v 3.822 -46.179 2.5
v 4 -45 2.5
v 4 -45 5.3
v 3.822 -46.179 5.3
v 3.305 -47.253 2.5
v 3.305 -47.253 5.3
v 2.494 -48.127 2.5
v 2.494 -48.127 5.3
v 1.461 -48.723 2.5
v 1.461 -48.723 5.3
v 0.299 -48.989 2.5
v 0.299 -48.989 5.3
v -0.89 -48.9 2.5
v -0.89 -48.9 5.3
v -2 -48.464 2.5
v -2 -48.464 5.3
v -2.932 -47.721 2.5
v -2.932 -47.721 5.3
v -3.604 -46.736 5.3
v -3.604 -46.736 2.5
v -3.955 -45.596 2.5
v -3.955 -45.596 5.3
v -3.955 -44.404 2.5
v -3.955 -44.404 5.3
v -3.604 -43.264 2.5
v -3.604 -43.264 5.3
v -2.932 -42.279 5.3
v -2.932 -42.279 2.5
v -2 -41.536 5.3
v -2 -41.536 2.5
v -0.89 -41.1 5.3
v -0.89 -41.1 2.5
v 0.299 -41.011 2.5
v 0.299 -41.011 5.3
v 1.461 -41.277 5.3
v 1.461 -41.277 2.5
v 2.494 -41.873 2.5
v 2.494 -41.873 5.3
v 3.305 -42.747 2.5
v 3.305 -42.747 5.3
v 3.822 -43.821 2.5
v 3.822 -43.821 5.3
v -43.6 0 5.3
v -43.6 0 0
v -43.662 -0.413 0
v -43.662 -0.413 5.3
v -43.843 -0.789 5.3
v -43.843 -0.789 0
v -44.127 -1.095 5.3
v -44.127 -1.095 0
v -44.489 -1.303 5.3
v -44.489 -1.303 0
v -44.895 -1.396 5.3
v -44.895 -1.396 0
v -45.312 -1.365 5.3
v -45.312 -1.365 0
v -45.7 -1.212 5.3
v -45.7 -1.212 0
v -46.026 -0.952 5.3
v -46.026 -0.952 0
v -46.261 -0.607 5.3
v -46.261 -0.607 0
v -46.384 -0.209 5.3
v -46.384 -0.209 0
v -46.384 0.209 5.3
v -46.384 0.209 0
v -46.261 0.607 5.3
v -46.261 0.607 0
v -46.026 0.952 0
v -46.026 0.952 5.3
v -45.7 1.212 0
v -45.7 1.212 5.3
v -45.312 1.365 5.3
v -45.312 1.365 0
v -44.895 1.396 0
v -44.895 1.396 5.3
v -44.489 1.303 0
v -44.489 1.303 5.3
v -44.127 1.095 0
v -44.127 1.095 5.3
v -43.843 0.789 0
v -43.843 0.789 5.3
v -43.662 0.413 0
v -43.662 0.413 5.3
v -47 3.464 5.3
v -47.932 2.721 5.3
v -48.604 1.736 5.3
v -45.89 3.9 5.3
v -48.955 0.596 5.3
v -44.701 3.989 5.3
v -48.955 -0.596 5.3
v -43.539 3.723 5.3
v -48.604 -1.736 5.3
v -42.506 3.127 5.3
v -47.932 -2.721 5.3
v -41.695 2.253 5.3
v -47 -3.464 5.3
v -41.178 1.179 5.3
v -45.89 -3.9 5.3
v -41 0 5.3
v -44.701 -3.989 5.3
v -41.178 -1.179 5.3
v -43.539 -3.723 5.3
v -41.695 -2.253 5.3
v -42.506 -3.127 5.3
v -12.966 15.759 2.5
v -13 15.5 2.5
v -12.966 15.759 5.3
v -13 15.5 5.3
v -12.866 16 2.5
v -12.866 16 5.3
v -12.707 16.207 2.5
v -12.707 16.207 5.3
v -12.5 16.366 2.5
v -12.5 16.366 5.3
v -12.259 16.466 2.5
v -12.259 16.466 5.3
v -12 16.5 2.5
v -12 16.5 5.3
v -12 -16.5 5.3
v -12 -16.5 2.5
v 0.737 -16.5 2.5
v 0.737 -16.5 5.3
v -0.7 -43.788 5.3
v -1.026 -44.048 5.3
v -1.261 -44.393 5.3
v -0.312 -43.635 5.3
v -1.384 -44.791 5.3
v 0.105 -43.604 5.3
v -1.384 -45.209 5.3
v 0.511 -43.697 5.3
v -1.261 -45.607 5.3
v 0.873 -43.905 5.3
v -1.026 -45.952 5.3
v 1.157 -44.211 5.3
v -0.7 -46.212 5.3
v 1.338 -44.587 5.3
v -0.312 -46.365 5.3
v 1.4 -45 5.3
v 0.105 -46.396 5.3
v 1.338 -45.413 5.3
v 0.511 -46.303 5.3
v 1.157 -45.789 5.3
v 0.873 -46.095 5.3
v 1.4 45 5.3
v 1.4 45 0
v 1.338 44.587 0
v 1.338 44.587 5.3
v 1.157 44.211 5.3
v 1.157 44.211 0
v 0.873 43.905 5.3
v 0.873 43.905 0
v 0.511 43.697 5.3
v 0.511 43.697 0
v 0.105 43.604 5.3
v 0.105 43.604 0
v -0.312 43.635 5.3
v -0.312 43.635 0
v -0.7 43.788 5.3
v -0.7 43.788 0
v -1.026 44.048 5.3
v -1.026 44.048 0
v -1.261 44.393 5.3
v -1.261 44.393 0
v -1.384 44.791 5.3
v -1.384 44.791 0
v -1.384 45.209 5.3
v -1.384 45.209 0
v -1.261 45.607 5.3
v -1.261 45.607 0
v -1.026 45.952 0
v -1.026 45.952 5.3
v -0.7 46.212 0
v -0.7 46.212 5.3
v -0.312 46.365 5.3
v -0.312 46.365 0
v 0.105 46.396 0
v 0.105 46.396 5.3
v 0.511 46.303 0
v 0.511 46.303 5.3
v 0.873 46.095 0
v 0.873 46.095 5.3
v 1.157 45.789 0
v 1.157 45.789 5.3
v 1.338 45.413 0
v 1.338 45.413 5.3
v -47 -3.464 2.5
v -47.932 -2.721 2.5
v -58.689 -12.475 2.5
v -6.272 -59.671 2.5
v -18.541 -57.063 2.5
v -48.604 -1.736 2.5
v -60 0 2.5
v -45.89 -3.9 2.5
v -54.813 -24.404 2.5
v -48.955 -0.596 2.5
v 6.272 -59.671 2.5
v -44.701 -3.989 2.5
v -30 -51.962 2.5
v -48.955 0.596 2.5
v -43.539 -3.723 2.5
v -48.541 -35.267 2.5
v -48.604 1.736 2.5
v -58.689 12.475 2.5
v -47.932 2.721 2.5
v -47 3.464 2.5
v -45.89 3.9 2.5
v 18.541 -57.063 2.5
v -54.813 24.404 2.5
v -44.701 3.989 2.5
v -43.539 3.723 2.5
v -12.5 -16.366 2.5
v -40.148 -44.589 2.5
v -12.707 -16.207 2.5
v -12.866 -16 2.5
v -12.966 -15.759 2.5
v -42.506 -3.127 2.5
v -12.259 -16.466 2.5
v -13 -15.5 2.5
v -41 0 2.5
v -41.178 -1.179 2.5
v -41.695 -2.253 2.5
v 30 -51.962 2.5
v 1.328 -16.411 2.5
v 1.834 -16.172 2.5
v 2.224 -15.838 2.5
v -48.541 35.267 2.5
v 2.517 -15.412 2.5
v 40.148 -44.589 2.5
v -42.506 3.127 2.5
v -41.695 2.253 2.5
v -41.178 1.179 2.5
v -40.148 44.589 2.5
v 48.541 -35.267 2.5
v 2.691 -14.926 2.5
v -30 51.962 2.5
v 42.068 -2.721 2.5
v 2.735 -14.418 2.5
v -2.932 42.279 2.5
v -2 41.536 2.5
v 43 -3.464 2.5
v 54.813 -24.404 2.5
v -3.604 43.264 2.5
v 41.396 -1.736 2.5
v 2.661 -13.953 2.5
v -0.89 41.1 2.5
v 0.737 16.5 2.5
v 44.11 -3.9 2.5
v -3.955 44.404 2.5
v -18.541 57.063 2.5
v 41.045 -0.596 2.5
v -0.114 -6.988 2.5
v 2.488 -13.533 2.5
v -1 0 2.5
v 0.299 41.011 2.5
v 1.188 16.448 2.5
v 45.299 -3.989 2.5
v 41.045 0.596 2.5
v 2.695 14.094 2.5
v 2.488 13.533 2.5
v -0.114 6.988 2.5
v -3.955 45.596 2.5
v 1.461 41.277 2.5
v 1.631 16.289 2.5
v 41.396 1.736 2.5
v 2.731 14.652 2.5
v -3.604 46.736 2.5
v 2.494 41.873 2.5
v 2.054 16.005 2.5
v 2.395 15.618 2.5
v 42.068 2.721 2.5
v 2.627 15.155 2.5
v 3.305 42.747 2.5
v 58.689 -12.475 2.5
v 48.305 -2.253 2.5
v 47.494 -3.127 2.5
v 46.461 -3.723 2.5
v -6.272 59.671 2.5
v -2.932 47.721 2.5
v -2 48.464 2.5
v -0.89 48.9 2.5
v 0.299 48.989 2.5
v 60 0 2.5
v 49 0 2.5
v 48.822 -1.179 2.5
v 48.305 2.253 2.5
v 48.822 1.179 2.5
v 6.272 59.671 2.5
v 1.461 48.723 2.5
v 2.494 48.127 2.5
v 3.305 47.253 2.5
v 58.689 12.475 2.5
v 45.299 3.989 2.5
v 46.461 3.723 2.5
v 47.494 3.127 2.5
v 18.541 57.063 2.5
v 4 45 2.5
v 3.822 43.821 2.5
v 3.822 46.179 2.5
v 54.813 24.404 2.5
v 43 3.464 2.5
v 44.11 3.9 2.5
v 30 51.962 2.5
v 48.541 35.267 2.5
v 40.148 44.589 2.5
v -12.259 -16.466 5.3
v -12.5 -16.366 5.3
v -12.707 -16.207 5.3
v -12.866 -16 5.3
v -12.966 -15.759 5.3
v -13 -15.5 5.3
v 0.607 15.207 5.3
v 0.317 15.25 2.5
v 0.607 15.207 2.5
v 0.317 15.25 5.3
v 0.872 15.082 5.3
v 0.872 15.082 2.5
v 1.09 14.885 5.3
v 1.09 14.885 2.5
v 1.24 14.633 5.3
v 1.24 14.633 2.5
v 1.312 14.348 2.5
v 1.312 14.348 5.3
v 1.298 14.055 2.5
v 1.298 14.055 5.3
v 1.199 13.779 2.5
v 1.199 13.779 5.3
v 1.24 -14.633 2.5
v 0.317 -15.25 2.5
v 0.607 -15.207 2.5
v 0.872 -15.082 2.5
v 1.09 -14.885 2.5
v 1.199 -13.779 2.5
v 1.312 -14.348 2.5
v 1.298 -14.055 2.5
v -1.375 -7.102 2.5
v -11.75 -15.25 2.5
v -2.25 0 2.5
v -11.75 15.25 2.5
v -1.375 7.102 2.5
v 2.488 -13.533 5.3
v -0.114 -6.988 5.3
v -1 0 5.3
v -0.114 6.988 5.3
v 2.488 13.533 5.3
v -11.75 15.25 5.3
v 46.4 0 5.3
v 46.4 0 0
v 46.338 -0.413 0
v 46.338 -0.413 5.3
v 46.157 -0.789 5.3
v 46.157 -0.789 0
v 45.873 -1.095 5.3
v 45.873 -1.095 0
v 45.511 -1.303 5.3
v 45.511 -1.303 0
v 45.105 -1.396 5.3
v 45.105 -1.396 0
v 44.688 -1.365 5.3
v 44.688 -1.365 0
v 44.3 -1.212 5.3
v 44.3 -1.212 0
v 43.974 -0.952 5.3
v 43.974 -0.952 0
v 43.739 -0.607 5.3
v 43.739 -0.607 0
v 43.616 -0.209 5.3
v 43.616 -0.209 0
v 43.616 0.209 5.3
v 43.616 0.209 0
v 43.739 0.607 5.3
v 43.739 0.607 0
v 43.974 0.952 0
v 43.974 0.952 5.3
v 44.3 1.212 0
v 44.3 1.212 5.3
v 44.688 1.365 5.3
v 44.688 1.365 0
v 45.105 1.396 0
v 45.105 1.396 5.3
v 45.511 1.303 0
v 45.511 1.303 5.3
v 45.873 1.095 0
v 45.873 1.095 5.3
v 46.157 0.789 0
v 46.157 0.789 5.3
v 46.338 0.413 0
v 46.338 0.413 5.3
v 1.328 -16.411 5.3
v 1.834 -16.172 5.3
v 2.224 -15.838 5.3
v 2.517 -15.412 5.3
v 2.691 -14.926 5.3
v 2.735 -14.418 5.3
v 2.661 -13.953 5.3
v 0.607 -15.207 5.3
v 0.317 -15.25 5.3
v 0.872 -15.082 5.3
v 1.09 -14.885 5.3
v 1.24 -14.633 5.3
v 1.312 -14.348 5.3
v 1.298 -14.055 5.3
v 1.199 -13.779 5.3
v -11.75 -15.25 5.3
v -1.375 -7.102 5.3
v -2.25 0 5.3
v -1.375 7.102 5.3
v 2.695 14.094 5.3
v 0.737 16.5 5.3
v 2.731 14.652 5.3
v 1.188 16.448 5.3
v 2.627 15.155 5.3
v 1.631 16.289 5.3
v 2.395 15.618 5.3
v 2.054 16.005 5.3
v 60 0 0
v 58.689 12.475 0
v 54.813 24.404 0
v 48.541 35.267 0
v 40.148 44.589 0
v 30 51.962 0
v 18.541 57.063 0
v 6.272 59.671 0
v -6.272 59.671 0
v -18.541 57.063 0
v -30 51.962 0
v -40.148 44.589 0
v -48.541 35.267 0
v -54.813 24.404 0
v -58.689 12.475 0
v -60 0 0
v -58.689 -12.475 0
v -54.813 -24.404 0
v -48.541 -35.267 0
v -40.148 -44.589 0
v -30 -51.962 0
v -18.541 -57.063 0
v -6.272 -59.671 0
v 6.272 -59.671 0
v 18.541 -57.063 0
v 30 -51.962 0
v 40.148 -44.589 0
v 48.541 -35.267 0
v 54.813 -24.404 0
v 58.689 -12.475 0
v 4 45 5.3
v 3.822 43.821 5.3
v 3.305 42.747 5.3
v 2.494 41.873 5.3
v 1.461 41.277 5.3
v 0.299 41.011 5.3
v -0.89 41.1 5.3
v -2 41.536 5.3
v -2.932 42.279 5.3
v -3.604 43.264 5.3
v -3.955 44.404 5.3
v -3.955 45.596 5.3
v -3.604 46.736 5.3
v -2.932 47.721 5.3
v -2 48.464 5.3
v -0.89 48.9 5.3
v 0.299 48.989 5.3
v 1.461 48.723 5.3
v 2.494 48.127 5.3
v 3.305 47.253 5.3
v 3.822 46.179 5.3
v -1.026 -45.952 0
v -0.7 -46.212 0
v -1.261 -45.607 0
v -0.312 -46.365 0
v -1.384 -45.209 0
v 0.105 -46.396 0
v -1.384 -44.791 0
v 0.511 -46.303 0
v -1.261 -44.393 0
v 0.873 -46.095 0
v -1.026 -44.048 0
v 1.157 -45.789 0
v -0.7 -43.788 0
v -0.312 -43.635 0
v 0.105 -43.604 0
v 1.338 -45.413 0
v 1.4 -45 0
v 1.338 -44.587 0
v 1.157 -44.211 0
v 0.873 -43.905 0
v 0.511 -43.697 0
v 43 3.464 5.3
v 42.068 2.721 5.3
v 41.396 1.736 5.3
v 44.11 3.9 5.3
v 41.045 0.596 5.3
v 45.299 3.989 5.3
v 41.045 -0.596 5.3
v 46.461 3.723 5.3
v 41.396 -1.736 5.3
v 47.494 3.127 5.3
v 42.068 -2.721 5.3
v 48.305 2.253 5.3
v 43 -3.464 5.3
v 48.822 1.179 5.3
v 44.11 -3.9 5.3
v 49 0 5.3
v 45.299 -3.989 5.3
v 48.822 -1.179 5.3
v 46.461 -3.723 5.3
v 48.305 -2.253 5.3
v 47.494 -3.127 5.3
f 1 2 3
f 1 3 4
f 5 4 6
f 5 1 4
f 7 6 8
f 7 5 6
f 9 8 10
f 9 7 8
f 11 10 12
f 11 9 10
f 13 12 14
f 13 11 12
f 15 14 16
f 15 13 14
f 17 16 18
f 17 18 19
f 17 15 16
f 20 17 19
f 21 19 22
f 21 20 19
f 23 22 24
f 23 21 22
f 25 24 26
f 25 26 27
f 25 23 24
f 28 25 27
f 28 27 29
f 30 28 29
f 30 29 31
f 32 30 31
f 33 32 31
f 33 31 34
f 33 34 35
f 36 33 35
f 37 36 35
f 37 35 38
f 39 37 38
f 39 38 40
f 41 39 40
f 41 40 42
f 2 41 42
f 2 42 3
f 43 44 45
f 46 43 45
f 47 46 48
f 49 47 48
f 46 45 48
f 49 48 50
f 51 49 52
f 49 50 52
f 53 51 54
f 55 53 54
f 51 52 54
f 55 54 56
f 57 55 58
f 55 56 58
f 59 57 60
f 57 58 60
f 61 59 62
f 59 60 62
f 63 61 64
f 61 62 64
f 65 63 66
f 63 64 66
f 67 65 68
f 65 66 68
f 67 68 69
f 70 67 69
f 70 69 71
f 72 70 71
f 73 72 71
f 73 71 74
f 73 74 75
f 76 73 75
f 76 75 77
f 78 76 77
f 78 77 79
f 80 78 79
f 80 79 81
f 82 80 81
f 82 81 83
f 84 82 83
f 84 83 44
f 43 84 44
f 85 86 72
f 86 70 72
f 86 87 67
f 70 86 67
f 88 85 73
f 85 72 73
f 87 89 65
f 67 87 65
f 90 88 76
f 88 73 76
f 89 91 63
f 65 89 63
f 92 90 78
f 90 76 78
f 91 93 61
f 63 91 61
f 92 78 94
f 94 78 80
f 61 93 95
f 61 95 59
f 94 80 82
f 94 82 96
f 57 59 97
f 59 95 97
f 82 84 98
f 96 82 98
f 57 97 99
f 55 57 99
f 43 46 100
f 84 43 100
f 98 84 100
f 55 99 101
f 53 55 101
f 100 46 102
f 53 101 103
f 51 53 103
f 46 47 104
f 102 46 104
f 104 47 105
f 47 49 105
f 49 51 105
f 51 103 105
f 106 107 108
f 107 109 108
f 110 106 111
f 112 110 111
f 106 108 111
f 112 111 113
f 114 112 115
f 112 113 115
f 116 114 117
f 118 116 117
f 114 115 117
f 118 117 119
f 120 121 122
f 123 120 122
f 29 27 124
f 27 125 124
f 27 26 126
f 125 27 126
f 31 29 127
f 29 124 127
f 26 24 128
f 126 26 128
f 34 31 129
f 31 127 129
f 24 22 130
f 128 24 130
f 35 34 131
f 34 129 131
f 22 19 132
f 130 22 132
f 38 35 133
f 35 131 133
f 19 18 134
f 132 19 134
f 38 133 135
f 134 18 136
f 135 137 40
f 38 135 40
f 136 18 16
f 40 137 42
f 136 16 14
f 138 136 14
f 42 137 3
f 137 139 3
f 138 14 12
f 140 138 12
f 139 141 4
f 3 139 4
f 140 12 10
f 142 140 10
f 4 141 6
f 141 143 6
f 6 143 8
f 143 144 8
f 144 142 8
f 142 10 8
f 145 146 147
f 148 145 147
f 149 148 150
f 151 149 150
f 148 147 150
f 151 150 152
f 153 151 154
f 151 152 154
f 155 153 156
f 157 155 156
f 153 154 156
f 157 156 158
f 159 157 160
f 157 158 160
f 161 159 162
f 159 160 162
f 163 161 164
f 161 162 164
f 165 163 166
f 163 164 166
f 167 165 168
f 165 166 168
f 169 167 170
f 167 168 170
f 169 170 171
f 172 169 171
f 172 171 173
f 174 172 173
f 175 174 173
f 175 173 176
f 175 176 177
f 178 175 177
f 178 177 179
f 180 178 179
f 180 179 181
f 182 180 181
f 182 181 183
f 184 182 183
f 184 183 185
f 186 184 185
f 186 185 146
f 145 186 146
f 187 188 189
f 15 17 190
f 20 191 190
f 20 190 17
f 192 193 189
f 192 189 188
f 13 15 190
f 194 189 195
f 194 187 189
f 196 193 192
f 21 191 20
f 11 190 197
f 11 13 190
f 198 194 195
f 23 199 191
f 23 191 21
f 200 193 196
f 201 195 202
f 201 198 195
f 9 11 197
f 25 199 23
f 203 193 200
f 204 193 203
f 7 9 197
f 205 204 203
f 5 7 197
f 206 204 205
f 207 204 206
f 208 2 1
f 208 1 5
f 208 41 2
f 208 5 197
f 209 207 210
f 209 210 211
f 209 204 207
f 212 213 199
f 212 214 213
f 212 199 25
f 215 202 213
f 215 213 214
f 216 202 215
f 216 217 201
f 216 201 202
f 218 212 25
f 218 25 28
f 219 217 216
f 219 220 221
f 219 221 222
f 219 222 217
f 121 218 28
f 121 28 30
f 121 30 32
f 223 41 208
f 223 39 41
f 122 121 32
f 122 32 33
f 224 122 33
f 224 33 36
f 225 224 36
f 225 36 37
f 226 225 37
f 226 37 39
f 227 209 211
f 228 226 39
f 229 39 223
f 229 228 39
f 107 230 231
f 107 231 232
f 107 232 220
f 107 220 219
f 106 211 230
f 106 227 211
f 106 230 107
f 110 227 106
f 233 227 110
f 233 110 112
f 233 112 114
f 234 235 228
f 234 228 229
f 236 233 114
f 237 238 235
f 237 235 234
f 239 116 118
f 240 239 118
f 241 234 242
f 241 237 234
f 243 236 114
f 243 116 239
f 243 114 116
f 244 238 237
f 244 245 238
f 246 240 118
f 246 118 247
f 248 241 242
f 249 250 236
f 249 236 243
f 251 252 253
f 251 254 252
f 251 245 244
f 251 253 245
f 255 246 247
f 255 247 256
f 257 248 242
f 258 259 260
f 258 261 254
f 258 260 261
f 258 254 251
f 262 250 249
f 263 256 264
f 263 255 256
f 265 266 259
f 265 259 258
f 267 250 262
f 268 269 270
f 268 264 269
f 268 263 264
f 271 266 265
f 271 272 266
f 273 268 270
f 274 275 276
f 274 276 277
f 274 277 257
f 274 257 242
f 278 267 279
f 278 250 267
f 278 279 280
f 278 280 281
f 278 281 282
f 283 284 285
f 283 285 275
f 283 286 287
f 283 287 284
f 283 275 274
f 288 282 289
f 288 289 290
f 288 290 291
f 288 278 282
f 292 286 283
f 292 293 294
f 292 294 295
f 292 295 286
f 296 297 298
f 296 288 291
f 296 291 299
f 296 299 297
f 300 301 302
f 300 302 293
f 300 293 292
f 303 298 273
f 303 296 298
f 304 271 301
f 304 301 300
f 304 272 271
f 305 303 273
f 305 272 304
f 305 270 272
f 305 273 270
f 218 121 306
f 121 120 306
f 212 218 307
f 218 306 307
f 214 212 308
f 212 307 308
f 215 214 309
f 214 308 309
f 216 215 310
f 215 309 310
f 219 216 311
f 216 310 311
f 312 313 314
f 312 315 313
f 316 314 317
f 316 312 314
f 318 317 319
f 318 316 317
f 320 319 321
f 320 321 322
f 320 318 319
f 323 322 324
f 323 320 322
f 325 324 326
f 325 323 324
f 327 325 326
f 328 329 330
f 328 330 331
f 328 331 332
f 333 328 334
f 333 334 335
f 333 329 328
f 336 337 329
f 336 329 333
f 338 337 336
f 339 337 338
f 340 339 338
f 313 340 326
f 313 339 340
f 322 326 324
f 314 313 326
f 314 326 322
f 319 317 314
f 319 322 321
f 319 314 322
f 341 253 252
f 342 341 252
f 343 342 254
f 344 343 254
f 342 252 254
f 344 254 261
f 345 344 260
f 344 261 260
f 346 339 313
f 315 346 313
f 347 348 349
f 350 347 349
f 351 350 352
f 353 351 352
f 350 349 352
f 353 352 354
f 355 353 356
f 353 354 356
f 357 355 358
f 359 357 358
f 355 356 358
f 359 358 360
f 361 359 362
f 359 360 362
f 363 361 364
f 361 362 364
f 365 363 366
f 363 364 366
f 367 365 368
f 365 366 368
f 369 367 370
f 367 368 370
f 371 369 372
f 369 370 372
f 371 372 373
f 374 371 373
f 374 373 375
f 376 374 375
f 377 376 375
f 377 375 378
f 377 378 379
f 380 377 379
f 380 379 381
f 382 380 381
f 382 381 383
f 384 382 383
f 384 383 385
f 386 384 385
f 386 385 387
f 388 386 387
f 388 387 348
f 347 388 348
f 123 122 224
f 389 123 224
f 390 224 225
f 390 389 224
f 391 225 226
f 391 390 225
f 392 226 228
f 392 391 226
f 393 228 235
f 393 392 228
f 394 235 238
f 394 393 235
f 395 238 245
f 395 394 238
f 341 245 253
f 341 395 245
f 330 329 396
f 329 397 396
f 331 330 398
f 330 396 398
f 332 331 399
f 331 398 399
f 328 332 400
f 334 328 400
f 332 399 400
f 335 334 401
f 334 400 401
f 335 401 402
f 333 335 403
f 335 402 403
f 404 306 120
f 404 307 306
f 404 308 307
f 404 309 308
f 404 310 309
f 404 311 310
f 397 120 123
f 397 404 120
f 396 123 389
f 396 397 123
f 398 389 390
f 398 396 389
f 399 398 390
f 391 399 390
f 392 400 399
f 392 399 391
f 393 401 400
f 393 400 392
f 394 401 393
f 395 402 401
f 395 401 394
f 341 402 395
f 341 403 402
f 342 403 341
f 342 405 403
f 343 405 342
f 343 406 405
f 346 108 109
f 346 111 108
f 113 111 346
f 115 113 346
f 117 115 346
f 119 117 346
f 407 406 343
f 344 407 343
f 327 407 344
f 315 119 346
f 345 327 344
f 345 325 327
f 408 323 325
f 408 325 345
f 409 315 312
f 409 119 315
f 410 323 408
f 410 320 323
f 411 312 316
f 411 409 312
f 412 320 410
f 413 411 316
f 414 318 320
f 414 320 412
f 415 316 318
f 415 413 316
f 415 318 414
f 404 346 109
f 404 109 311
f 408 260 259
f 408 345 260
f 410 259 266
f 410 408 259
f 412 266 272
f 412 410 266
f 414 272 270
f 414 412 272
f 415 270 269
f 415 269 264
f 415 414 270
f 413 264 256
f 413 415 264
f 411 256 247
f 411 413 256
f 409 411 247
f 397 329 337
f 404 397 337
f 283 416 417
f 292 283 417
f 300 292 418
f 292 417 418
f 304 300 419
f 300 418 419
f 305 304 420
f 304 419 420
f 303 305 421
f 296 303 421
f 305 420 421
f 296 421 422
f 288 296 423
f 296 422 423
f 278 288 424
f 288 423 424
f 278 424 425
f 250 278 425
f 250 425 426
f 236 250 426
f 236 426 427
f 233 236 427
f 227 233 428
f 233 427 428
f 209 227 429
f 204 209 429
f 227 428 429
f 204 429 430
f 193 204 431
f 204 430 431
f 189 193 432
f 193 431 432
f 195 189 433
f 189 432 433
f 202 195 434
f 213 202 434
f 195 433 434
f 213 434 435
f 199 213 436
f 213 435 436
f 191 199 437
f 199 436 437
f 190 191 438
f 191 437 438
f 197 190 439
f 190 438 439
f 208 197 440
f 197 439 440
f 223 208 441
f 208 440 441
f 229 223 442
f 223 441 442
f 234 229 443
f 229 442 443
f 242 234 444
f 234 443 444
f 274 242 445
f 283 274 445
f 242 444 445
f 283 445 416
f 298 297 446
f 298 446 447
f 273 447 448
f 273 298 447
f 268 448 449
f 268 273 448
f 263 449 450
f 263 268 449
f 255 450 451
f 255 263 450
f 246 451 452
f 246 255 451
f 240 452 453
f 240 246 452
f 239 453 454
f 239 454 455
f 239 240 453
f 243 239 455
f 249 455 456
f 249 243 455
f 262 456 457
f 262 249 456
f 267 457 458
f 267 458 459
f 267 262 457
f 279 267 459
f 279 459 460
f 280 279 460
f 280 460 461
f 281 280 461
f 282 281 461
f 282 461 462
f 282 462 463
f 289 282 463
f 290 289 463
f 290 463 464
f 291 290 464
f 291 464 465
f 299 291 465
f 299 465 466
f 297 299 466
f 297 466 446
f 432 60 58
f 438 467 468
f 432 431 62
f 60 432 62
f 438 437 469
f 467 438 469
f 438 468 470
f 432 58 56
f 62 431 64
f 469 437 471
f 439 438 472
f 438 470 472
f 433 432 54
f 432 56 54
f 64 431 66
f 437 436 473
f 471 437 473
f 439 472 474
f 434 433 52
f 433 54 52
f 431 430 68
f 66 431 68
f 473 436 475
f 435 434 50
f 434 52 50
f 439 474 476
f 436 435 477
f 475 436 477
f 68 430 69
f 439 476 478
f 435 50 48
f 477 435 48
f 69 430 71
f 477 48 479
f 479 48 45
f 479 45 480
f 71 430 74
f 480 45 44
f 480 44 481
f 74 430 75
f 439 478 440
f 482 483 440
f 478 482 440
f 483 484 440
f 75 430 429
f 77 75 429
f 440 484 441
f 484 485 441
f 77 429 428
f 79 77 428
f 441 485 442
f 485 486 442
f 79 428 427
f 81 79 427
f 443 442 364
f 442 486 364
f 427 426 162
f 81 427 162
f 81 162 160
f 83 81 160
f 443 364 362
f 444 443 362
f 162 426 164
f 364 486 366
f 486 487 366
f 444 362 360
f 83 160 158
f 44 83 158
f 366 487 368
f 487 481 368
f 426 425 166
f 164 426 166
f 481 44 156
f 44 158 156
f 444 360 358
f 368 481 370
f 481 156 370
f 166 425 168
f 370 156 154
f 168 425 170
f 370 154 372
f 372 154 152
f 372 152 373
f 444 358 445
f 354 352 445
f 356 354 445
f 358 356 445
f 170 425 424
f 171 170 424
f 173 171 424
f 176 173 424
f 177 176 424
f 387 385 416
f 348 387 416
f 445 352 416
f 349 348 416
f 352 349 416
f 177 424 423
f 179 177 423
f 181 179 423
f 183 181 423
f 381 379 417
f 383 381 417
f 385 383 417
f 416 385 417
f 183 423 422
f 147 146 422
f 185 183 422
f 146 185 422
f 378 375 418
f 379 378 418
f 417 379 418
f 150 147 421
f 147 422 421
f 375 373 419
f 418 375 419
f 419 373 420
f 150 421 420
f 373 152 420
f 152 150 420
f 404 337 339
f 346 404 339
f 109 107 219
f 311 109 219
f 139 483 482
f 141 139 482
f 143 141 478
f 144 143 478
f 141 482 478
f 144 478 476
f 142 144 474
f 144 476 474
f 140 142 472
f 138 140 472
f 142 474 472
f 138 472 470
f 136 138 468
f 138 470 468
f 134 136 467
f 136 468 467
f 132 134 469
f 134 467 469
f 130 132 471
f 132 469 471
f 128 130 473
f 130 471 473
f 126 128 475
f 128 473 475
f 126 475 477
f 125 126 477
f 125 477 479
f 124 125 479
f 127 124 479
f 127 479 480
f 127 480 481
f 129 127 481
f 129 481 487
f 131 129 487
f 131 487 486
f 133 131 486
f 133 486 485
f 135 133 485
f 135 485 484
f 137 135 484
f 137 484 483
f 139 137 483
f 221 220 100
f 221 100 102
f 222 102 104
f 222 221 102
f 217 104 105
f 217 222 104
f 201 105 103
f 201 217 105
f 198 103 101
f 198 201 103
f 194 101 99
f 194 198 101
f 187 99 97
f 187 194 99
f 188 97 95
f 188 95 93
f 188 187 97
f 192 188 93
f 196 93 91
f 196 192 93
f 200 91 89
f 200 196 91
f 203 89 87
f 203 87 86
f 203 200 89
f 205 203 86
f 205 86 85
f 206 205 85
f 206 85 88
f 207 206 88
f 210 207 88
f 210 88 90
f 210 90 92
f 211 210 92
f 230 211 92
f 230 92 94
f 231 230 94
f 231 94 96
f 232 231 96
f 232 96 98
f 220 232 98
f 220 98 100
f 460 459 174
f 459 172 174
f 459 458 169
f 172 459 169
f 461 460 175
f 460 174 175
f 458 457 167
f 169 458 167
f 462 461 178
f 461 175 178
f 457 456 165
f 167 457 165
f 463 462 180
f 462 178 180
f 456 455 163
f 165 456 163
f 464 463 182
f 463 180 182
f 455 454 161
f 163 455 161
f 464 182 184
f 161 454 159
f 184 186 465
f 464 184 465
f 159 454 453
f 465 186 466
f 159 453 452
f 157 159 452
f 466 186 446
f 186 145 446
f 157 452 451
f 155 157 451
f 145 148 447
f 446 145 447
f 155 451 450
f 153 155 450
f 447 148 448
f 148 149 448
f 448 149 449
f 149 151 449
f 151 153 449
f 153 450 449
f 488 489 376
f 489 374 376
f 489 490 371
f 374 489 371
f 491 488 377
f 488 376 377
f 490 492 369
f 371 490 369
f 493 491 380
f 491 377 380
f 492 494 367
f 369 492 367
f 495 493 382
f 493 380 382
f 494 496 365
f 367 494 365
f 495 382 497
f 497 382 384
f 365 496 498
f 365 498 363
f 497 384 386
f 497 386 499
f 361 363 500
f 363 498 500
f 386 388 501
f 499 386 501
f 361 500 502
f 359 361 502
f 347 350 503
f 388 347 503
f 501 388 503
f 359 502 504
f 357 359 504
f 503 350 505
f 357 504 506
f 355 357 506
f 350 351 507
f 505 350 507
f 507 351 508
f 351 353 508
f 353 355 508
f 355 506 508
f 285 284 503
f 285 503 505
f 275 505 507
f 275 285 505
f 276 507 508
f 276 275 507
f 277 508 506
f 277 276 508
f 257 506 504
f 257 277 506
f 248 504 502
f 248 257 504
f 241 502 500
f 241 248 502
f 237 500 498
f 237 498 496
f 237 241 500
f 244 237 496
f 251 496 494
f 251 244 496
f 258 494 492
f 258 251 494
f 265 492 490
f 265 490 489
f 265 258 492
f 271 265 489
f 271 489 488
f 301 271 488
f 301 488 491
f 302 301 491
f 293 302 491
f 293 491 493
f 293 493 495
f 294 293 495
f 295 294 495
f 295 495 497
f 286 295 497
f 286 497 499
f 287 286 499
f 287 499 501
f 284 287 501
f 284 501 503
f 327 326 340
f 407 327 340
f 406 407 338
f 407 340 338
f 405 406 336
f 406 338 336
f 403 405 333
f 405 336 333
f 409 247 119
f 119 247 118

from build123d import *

# Parameters (mm, degrees)
F0_R     = 60
F1_DEPTH = 2.5
F2_R     = 1.4
F3_DEPTH = 12.5
F2_R_2   = 4
F4_DEPTH = 5.3
F6_DEPTH = 2.8
F7_R     = 2
F8_R     = 1


with BuildPart() as f1:
    # F0 (on Top) → F1 (new body)
    with BuildSketch(Plane.XY):
        Circle(F0_R)
    extrude(amount=F1_DEPTH)

    # F2 (on face) → F3 (cut, symmetric)
    with BuildSketch(Plane(origin=(0, 0, 0), x_dir=(1, 0, 0), z_dir=(0, 0, -1))):
        with Locations((0, -45)):
            Circle(F2_R)
        with Locations((-45, 0)):
            Circle(F2_R)
        with Locations((0, 45)):
            Circle(F2_R)
        with Locations((45, 0)):
            Circle(F2_R)
    extrude(amount=F3_DEPTH, both=True, mode=Mode.SUBTRACT)

    # F2 (on face) → F4 (join)
    with BuildSketch(Plane(origin=(0, 0, 0), x_dir=(1, 0, 0), z_dir=(0, 0, -1))):
        with Locations((-45, 0)):
            Circle(F2_R_2)
        with Locations((-45, 0)):
            Circle(F2_R, mode=Mode.SUBTRACT)
        with Locations((0, -45)):
            Circle(F2_R_2)
        with Locations((0, -45)):
            Circle(F2_R, mode=Mode.SUBTRACT)
        with Locations((45, 0)):
            Circle(F2_R_2)
        with Locations((45, 0)):
            Circle(F2_R, mode=Mode.SUBTRACT)
        with Locations((0, 45)):
            Circle(F2_R_2)
        with Locations((0, 45)):
            Circle(F2_R, mode=Mode.SUBTRACT)
    extrude(amount=-F4_DEPTH)

    # F5 (on face) → F6 (join)
    with BuildSketch(Plane.XY.offset(2.5)):
        with BuildLine():
            ThreePointArc((2.0400320513, 15.25), (2.4361318862, 15.8801411608), (2.8481367178, 16.5))
            Line((2.8481367178, 16.5), (-13, 16.5))
            Line((-13, 16.5), (-13, -16.5))
            Line((-13, -16.5), (2.8481367178, -16.5))
            ThreePointArc((2.8481367178, -16.5), (2.4361318862, -15.8801411608), (2.0400320513, -15.25))
            Line((2.0400320513, -15.25), (-11.75, -15.25))
            Line((-11.75, -15.25), (-11.75, 15.25))
            Line((-11.75, 15.25), (2.0400320513, 15.25))
        make_face()
        with BuildLine():
            ThreePointArc((3.5172935972, 15.25), (3.939229747, 15.8808335844), (4.3781079483, 16.5))
            Line((4.3781079483, 16.5), (2.8481367178, 16.5))
            ThreePointArc((2.8481367178, 16.5), (2.4361318862, 15.8801411608), (2.0400320513, 15.25))
            Line((2.0400320513, 15.25), (3.5172935972, 15.25))
        make_face()
        with BuildLine():
            Line((2.8481367178, -16.5), (4.3781079483, -16.5))
            ThreePointArc((4.3781079483, -16.5), (3.939229747, -15.8808335844), (3.5172935972, -15.25))
            Line((3.5172935972, -15.25), (2.0400320513, -15.25))
            ThreePointArc((2.0400320513, -15.25), (2.4361318862, -15.8801411608), (2.8481367178, -16.5))
        make_face()
        with BuildLine():
            ThreePointArc((3.5172935972, -15.25), (-1, 0), (3.5172935972, 15.25))
            Line((3.5172935972, 15.25), (2.0400320513, 15.25))
            ThreePointArc((2.0400320513, 15.25), (-2.25, 0), (2.0400320513, -15.25))
            Line((2.0400320513, -15.25), (3.5172935972, -15.25))
        make_face()
    extrude(amount=F6_DEPTH)

    # F7
    f7_edges = [f1.edges().sort_by_distance(p)[0] for p in [
        (4.378108, 16.5, 3.9),
        (4.378108, -16.5, 3.9),
    ]]
    fillet(f7_edges, radius=F7_R)

    # F8
    f8_edges = [f1.edges().sort_by_distance(p)[0] for p in [
        (2.040032, -15.25, 3.9),
        (2.040032, 15.25, 3.9),
        (-13, -16.5, 3.9),
        (-13, 16.5, 3.9),
    ]]
    fillet(f8_edges, radius=F8_R)


solid = f1.part
